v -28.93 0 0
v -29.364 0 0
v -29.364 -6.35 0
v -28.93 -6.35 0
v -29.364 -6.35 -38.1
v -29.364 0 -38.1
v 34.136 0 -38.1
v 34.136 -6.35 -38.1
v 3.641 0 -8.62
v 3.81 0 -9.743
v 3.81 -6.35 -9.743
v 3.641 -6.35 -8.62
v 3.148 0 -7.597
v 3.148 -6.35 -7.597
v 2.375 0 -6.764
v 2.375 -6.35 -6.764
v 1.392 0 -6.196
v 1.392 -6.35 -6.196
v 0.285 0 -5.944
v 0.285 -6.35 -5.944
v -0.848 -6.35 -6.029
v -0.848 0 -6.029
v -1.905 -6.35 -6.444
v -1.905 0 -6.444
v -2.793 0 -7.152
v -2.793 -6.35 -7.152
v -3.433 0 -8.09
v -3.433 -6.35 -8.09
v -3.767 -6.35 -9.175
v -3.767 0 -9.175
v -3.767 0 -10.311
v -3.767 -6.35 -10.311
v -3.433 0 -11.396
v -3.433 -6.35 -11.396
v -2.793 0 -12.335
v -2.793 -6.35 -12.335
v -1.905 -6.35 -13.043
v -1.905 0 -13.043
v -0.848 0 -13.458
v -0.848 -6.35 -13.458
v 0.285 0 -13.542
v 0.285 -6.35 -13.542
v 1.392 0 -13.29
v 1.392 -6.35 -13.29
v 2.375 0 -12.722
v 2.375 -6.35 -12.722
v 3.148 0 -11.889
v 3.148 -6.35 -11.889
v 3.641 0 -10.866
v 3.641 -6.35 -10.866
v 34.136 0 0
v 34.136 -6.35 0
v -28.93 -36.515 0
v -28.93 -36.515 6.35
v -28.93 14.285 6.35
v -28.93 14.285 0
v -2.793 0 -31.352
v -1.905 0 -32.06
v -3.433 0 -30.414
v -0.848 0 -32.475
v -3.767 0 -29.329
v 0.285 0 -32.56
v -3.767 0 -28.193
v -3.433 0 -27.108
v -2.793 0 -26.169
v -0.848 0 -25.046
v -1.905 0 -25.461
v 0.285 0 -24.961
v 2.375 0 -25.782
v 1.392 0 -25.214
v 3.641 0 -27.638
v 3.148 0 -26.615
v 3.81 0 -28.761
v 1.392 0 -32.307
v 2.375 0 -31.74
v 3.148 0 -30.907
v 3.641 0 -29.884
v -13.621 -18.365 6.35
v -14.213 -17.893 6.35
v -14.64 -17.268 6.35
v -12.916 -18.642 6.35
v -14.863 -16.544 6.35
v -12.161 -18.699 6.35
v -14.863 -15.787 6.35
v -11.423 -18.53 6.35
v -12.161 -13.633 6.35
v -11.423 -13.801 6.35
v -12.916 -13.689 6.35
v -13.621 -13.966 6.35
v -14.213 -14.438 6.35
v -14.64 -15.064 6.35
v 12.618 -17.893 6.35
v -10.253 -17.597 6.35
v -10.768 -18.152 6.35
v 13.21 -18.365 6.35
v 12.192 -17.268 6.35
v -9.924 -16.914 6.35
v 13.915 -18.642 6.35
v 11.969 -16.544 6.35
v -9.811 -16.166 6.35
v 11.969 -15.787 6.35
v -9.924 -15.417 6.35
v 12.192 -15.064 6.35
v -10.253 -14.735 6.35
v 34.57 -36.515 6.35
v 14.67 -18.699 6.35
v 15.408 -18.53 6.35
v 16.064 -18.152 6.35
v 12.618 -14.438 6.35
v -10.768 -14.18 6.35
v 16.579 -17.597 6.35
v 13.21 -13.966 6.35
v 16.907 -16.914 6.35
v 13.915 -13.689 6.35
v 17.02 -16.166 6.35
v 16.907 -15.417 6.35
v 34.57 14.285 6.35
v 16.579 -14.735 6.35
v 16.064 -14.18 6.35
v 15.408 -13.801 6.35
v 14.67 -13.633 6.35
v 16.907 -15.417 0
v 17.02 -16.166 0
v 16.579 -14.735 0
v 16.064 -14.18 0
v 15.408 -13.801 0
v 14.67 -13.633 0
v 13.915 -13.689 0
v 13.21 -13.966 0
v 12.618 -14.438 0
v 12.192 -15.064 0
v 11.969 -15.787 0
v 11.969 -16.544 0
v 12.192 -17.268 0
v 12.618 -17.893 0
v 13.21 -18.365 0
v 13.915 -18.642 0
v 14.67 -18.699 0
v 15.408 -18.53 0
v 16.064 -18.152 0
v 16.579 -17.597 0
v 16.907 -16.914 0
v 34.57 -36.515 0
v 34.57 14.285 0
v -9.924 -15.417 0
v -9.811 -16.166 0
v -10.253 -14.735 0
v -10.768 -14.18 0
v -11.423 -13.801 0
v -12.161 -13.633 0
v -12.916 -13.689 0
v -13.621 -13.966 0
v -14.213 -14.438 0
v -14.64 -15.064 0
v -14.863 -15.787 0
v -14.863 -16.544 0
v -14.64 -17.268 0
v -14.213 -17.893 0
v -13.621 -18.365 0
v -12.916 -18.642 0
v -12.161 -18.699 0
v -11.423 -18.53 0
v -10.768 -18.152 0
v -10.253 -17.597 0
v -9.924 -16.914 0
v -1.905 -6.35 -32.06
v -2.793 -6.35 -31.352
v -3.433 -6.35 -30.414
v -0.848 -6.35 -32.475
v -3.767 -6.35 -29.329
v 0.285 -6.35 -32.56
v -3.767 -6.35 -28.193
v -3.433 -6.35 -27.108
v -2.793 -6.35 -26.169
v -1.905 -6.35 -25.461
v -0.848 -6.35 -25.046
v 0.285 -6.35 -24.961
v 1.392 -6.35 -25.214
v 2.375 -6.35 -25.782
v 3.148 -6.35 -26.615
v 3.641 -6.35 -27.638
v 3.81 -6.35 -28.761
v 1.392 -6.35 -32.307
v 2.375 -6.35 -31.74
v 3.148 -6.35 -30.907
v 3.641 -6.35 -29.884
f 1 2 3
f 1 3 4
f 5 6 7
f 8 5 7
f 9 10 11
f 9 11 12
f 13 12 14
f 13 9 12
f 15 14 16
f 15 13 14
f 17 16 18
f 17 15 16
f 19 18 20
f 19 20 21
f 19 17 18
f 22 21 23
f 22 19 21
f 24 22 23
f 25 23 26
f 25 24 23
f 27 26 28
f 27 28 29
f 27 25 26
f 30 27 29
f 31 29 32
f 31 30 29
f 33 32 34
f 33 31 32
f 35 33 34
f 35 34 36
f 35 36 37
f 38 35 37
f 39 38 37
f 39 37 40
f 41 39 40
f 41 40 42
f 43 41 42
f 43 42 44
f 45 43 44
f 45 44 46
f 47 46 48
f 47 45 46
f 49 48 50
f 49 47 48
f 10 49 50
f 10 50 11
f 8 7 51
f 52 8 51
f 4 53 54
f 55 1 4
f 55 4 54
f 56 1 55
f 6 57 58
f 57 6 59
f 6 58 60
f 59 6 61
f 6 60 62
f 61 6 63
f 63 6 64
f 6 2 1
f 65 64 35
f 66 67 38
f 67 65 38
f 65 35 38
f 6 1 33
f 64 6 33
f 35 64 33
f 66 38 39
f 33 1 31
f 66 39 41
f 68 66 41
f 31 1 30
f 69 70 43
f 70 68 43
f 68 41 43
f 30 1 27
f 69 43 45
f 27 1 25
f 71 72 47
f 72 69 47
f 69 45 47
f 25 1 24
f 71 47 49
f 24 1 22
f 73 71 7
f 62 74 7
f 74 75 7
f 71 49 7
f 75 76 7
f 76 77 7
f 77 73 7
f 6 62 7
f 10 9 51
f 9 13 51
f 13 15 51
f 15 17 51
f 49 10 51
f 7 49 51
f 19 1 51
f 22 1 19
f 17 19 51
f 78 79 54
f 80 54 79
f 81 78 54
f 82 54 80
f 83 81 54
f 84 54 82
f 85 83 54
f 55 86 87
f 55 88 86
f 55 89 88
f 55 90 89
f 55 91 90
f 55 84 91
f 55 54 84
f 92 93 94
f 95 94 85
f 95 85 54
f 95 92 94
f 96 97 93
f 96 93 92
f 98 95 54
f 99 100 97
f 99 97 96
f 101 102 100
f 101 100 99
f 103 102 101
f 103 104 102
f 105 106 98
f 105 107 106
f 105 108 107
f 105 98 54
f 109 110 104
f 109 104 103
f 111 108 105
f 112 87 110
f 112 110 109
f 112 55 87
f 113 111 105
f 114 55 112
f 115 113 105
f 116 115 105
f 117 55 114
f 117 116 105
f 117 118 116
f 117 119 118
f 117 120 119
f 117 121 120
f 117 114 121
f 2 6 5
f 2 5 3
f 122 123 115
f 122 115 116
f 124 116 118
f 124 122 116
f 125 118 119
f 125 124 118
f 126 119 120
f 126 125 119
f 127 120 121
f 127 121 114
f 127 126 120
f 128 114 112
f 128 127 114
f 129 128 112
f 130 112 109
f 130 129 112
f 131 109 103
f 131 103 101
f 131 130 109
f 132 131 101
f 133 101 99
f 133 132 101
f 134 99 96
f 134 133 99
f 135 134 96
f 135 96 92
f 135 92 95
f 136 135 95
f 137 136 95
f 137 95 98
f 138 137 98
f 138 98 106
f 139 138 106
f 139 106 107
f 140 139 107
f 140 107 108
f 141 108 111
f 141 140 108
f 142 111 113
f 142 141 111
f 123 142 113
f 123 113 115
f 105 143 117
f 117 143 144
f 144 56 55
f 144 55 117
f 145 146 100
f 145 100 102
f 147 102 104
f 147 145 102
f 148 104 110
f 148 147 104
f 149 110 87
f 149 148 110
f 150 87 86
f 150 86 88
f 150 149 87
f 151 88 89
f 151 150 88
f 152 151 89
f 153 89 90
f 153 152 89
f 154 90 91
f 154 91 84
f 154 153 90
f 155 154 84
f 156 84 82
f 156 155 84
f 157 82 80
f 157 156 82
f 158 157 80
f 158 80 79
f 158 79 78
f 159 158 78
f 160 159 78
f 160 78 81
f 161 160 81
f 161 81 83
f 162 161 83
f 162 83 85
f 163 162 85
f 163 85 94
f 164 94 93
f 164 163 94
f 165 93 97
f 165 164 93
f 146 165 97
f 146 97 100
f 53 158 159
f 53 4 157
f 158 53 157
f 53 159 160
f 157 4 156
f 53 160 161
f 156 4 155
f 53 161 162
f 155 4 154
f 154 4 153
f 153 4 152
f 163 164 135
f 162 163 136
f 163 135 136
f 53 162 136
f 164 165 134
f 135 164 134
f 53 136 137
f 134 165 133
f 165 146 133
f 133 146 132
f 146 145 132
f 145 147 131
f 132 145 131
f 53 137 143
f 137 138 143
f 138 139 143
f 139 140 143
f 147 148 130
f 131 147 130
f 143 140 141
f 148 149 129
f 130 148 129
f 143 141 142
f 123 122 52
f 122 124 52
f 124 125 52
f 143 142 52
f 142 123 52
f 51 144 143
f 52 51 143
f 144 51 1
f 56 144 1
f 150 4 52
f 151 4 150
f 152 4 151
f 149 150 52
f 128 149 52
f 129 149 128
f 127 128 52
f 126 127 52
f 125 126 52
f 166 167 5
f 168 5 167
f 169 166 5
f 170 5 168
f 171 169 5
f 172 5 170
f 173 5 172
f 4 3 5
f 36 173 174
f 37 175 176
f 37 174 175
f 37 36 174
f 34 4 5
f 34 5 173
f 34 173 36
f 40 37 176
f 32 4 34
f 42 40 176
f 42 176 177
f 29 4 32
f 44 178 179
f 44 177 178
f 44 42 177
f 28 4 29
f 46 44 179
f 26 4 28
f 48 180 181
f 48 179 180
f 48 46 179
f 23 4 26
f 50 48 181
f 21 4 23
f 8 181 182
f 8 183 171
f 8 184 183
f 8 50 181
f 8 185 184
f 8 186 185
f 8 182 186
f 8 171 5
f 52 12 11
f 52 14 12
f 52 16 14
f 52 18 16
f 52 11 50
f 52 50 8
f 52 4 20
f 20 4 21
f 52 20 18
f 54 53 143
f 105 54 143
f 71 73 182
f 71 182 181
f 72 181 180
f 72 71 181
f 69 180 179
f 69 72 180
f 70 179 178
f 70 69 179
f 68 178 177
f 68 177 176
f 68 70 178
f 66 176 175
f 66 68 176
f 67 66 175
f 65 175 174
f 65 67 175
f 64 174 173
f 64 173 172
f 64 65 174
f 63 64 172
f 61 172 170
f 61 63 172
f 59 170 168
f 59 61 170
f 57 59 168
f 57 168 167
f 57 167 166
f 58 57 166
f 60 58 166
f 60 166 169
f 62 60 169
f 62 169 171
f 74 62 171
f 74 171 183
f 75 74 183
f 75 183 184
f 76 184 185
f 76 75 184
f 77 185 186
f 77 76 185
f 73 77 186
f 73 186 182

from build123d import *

# Parameters (mm, degrees)
F0_W     = 63.5
F0_H     = 50.8
F0_R     = 2.54
F2_DEPTH = 6.35
F1_W     = 63.5
F1_H     = 38.1
F1_R     = 3.81
F3_DEPTH = 6.35


with BuildPart() as f2:
    # F0 (on Top) → F2 (new body)
    with BuildSketch(Plane.XY):
        with Locations((2.81966, -11.114502)):
            Rectangle(F0_W, F0_H)
        with Locations((-12.351194, -16.165679)):
            Circle(F0_R, mode=Mode.SUBTRACT)
        with Locations((14.480258, -16.165679)):
            Circle(F0_R, mode=Mode.SUBTRACT)
    extrude(amount=F2_DEPTH)

    # F1 (on Front) → F3 (join)
    with BuildSketch(Plane.XZ):
        with Locations((2.38584, -19.05)):
            Rectangle(F1_W, F1_H)
        with Locations((0, -28.760821)):
            Circle(F1_R, mode=Mode.SUBTRACT)
        with Locations((0, -9.743084)):
            Circle(F1_R, mode=Mode.SUBTRACT)
    extrude(amount=F3_DEPTH)


solid = f2.part
